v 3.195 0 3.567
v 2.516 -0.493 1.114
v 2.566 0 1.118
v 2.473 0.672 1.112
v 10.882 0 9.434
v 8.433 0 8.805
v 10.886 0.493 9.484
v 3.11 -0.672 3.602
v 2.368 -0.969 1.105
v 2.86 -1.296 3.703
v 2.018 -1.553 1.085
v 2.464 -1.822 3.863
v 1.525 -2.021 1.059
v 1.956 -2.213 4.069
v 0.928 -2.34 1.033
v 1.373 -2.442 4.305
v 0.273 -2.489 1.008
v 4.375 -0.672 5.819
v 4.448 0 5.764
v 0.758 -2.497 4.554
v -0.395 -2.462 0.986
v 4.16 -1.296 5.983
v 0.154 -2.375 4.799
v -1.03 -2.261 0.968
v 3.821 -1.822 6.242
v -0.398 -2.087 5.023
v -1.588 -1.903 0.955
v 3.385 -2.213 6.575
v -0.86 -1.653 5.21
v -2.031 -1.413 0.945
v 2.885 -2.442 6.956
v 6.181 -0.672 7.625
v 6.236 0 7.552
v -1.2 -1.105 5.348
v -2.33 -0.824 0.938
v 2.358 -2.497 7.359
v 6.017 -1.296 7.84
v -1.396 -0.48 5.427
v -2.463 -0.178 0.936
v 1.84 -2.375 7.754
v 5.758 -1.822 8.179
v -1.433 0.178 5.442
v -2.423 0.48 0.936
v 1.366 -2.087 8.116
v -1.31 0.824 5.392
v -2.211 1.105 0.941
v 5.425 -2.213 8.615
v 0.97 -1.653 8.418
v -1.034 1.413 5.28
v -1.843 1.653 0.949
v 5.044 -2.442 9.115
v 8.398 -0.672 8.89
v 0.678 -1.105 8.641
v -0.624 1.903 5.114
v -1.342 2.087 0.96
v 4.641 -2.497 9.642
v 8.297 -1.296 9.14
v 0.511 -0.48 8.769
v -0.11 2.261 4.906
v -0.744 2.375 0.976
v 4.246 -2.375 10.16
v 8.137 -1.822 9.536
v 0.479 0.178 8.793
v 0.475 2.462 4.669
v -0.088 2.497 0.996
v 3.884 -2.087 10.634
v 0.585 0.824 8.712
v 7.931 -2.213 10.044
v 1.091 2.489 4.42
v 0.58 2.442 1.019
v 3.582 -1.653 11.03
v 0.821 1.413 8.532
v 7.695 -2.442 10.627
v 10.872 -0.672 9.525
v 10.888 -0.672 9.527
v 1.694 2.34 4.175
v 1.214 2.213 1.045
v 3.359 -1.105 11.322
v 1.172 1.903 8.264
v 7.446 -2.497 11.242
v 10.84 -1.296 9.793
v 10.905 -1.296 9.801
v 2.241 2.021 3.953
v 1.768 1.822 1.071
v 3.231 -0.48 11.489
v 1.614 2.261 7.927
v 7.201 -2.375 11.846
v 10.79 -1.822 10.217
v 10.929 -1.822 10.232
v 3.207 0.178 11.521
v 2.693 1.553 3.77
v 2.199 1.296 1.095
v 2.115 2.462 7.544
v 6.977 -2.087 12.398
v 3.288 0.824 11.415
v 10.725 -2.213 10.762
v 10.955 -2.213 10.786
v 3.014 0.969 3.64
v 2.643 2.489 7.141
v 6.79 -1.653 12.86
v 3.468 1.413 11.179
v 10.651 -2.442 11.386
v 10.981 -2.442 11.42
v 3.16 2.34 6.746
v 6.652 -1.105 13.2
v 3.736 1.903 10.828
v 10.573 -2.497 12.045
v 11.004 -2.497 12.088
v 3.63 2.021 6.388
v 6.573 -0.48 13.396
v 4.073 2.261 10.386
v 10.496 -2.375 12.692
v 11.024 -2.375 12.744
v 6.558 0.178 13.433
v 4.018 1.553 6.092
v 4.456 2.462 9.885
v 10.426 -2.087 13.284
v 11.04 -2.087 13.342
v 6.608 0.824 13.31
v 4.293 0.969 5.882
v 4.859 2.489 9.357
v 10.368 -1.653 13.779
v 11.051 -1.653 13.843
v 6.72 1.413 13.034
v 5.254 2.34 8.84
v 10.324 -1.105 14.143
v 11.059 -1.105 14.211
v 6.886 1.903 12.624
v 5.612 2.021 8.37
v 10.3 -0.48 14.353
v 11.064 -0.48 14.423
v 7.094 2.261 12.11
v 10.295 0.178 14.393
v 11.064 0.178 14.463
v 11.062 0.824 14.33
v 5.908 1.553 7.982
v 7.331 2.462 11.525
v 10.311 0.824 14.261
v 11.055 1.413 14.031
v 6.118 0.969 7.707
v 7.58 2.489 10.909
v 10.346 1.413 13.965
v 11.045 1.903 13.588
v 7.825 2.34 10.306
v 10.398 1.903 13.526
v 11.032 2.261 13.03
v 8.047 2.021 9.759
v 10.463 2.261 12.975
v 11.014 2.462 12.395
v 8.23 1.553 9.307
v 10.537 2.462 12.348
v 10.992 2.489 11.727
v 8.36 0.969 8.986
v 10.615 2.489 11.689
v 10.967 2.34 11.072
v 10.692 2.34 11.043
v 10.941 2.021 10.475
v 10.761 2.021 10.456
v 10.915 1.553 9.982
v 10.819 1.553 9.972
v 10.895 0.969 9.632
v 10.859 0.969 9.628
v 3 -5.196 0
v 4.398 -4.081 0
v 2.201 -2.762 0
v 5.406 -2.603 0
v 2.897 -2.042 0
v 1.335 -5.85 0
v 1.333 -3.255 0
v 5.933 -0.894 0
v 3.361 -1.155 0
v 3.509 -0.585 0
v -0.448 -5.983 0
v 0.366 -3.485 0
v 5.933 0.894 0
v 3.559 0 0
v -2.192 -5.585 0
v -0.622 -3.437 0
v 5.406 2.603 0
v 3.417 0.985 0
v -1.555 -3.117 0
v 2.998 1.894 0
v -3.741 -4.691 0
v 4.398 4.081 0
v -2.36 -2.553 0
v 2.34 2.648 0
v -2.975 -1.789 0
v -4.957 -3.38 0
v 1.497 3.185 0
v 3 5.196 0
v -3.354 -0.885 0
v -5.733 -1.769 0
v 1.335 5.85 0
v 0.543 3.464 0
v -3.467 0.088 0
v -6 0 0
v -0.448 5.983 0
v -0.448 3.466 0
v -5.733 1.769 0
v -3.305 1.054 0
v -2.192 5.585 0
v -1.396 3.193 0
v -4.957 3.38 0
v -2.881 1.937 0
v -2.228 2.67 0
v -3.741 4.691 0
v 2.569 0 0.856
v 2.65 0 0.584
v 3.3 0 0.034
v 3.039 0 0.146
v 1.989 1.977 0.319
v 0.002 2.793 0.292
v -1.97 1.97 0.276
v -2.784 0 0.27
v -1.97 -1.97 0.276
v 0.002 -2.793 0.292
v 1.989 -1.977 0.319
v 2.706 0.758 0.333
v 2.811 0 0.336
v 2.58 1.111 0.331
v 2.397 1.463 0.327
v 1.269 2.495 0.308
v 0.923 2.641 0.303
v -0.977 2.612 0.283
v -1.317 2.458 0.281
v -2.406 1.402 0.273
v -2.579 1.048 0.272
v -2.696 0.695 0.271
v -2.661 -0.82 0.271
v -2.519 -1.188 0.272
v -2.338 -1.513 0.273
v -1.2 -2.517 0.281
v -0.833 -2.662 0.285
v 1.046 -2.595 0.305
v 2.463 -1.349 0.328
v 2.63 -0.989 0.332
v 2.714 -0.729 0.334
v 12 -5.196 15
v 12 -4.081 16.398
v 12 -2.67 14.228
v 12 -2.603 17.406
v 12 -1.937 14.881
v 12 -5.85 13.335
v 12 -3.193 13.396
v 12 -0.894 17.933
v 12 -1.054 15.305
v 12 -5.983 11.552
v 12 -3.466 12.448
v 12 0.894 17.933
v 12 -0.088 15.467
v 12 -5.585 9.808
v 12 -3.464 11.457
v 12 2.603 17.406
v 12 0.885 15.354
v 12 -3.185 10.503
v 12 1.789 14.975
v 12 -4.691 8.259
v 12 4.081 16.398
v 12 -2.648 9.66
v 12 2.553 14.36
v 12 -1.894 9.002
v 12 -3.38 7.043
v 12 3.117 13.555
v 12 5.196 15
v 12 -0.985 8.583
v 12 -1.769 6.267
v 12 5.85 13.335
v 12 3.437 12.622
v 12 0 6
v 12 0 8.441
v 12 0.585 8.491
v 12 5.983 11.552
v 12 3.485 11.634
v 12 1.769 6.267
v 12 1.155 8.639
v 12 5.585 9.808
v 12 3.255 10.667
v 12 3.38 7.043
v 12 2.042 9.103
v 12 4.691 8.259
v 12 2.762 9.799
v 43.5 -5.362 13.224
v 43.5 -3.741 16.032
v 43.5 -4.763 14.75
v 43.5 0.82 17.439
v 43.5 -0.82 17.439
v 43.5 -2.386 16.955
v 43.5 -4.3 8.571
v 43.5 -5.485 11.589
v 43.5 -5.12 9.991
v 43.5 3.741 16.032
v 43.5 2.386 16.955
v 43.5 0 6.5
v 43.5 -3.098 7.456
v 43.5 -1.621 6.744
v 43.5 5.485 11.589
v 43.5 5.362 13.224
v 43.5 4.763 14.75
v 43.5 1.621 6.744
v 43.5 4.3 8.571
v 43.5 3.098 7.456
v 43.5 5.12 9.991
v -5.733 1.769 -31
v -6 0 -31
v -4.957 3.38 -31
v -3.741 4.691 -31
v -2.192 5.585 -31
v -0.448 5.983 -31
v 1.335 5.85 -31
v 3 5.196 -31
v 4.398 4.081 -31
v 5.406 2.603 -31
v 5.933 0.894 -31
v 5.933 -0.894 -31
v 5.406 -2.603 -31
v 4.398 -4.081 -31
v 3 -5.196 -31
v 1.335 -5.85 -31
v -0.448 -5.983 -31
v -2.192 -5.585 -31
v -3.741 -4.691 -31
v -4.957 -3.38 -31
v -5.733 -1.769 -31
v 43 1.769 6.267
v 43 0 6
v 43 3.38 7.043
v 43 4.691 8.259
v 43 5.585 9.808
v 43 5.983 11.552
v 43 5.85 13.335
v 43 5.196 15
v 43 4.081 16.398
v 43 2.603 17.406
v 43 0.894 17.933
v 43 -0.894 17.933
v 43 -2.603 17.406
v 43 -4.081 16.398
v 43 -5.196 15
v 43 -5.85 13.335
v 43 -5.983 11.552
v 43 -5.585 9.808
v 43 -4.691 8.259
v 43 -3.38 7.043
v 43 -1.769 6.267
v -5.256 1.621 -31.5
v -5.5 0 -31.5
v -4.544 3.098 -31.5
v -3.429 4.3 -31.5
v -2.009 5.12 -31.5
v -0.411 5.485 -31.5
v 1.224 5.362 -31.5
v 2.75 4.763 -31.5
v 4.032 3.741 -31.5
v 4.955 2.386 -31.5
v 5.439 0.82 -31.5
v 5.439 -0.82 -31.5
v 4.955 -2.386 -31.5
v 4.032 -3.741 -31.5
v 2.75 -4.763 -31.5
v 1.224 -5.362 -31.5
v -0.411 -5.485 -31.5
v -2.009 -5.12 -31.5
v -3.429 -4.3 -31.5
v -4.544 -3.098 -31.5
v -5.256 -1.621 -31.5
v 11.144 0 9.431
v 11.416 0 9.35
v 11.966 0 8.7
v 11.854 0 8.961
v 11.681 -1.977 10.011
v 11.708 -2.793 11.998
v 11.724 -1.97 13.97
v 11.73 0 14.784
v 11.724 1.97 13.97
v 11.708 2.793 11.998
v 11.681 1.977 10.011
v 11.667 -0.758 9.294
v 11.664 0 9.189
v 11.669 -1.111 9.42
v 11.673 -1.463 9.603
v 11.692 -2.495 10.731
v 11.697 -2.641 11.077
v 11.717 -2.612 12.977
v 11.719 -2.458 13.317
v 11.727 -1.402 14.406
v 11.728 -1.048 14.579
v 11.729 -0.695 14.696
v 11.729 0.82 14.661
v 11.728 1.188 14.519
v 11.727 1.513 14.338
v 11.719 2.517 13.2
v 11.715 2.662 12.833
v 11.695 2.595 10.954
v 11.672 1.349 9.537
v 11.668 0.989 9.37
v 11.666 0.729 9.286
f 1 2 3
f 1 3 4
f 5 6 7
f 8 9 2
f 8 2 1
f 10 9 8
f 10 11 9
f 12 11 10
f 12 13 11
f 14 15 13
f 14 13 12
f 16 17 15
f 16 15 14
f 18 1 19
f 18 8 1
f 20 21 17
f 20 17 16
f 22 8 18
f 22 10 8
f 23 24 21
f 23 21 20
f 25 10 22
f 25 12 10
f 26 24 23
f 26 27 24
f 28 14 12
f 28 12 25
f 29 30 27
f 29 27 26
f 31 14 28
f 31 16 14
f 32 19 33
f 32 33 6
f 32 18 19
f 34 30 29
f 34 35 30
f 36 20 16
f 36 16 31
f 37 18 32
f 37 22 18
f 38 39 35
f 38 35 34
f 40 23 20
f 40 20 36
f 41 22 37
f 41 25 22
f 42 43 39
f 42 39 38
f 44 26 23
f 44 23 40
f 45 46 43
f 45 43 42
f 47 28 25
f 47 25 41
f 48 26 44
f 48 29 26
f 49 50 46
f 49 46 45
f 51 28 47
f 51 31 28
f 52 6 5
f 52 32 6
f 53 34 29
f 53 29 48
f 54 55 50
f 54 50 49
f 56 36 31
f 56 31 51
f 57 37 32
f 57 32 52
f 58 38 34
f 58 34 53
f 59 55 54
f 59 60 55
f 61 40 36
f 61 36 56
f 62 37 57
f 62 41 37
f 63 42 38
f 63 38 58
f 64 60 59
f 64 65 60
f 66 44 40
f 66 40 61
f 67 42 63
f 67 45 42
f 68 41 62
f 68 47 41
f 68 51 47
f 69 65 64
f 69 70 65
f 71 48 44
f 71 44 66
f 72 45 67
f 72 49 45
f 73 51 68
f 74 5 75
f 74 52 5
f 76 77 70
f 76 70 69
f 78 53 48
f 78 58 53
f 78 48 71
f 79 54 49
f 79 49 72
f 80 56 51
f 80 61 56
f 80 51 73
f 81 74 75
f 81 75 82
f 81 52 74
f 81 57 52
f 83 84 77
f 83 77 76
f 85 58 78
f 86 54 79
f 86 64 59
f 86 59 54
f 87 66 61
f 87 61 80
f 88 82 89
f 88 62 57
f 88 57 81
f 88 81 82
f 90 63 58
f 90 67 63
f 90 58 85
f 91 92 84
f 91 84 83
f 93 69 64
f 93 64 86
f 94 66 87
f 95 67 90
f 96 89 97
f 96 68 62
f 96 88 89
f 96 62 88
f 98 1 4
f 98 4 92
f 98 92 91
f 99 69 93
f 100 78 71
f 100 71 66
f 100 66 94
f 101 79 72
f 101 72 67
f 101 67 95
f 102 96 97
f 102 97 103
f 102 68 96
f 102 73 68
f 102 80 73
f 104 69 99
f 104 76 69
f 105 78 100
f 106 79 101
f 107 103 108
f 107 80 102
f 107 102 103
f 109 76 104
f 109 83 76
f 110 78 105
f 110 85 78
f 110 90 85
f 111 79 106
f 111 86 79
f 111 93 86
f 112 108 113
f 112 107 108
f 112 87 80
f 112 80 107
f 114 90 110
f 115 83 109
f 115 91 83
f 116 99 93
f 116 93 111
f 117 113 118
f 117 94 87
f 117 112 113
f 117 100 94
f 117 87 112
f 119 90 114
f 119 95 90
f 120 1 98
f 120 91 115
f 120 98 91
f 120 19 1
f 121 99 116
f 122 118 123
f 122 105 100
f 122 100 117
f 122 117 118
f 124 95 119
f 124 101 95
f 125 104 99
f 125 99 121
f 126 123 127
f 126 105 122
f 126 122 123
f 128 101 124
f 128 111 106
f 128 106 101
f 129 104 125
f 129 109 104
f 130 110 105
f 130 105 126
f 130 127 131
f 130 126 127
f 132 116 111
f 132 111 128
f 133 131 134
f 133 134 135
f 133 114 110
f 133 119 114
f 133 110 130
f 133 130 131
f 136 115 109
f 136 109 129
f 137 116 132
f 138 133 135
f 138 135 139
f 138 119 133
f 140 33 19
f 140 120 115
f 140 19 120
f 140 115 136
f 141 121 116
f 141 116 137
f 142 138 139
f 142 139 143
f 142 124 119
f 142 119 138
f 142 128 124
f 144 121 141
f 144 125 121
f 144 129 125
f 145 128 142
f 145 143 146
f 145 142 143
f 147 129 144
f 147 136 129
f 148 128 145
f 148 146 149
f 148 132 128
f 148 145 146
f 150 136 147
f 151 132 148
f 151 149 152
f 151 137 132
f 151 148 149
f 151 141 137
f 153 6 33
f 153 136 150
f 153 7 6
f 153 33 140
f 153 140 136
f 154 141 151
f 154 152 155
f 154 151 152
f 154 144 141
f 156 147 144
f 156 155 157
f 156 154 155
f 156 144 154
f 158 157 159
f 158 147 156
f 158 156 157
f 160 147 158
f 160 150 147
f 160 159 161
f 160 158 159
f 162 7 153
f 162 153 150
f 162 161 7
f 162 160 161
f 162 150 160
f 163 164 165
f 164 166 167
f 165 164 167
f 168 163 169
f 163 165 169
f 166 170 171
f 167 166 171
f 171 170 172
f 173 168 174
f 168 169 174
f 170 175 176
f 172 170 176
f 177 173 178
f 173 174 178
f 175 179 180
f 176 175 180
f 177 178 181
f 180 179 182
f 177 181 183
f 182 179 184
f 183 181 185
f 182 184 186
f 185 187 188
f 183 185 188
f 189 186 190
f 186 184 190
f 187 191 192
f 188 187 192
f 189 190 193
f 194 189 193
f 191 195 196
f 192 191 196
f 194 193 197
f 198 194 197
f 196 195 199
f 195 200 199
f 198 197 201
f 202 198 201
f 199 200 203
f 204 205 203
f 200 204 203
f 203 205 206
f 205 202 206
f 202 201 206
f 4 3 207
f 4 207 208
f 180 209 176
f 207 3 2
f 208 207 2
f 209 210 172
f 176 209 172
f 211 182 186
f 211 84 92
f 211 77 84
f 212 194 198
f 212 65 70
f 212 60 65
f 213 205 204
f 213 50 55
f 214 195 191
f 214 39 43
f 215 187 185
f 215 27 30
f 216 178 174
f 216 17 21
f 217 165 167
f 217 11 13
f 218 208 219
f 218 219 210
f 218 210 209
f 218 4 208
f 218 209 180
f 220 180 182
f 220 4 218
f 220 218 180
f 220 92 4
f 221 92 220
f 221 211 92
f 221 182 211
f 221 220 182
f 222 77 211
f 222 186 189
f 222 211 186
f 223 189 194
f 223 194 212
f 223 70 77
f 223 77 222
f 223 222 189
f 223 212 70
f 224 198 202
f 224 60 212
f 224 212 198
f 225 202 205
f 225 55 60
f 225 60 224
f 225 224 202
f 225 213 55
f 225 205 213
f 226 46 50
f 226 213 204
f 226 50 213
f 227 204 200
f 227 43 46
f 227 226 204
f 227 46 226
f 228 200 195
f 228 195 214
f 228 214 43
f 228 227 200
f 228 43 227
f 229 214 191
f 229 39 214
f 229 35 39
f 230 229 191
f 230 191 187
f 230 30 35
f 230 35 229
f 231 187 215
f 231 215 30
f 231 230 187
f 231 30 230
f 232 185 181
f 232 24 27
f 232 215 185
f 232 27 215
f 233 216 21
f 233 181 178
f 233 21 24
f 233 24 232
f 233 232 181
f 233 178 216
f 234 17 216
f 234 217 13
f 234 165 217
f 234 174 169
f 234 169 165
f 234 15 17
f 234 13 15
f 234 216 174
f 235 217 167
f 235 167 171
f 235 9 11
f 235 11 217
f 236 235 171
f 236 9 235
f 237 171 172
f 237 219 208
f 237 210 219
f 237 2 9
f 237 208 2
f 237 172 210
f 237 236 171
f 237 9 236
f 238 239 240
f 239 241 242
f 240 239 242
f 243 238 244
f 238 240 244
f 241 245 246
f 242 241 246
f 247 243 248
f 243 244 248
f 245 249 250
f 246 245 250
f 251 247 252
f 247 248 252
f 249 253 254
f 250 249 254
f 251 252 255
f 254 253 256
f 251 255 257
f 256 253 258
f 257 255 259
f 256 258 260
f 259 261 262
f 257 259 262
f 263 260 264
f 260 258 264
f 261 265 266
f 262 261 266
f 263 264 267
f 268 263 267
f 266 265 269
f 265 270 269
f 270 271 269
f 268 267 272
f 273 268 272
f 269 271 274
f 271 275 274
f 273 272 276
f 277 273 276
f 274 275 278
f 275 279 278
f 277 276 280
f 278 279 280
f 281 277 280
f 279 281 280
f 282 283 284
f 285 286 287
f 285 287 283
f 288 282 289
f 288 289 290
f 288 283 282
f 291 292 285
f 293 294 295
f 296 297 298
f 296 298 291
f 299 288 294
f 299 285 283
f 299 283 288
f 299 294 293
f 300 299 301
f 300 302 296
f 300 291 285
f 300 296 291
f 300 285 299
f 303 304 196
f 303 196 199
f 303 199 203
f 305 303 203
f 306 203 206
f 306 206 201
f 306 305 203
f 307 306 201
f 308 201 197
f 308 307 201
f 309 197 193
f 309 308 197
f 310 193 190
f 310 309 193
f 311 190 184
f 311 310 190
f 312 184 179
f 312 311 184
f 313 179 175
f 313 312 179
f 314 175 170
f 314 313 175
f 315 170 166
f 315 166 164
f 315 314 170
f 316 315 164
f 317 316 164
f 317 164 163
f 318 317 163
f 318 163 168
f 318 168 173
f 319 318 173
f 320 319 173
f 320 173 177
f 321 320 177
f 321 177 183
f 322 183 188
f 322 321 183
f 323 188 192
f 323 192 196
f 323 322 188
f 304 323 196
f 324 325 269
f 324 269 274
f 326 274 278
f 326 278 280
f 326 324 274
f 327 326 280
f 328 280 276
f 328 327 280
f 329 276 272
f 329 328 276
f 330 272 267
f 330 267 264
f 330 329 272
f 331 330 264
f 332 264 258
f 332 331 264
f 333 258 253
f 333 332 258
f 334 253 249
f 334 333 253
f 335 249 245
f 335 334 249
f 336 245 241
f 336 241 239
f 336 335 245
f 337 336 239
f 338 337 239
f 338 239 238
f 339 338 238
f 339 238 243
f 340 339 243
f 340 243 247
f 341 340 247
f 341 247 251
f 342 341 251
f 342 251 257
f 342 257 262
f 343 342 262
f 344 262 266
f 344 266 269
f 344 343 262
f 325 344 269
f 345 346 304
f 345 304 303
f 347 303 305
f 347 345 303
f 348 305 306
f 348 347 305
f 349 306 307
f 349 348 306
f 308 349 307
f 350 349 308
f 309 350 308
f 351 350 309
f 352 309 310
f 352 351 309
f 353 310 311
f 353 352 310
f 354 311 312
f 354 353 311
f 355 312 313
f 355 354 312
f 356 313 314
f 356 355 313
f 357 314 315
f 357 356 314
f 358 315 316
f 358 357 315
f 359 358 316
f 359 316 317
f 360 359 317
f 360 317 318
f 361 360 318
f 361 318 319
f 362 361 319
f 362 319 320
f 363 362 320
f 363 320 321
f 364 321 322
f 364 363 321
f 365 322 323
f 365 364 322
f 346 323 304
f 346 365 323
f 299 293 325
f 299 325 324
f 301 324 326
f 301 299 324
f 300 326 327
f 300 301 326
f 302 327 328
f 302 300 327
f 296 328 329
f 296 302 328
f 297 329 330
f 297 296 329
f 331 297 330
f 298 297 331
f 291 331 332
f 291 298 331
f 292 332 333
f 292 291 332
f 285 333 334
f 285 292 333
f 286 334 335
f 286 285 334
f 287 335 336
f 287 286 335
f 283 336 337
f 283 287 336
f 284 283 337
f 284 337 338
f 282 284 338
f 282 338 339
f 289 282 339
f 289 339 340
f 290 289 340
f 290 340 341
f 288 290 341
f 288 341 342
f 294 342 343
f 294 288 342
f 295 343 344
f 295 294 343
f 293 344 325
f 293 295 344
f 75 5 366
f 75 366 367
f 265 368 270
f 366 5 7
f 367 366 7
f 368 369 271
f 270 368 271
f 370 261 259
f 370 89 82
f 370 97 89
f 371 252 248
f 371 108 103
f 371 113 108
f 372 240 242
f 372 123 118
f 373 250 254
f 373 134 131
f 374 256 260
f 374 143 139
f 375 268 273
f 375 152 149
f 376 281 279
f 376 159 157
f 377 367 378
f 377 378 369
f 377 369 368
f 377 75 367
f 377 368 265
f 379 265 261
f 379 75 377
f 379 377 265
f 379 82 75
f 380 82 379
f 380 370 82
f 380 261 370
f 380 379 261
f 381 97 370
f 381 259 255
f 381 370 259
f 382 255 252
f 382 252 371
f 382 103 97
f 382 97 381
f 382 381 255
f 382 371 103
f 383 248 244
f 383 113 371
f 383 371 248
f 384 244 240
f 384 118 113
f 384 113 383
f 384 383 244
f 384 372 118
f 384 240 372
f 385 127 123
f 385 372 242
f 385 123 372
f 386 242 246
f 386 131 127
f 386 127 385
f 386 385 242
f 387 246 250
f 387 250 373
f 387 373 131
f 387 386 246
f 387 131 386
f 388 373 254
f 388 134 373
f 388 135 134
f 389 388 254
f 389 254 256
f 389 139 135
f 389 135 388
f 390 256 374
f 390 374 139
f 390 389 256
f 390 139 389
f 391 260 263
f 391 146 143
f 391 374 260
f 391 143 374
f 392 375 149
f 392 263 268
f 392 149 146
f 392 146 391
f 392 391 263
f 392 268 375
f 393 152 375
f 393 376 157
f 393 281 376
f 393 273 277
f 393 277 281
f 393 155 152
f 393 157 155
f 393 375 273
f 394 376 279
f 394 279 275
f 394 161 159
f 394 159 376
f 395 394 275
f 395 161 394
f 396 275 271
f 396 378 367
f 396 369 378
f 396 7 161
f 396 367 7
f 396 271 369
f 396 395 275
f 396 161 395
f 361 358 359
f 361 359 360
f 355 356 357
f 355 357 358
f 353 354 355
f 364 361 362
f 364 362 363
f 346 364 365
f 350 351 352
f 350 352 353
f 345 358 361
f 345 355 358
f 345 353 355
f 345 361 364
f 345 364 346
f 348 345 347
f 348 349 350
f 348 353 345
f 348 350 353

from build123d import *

# Parameters (mm, degrees)
SWEEP2_PROFILE_R     = 2.5
SKETCH49_R           = 6
BOSS_EXTRUDE9_DEPTH  = 31.5
SKETCH54_R           = 6
BOSS_EXTRUDE10_DEPTH = 31.5
FILLET32_R           = 1
FILLET33_R           = 1
CHAMFER1_SIZE        = 0.5
CHAMFER2_SIZE        = 0.5


with BuildPart() as part:
    # Sweep2: sweep along a path in Sketch1
    with BuildLine(Plane(origin=(0, 0, 0), x_dir=(1, 0, 0), z_dir=(0, 1, 0))) as sweep2_path:
        Line((0, 31.5), (0, 0))
        ThreePointArc((0, 0), (3.514718626, -8.485281374), (12, -12))
        Line((12, -12), (43.5, -12))
    # Sweep2 profile (on start of the path) → Sweep2 (sweep)
    with BuildSketch(Plane.XY.offset(-31.5)):
        Circle(SWEEP2_PROFILE_R)
    sweep(path=sweep2_path.line)

    # Sketch49 → Boss-Extrude9 (add)
    with BuildSketch(Plane(origin=(43.5, 0, 0), x_dir=(0, 0, -1), z_dir=(1, 0, 0))):
        with Locations((-12, 0)):
            Circle(SKETCH49_R)
    extrude(amount=-BOSS_EXTRUDE9_DEPTH)

    # Sketch54 → Boss-Extrude10 (add)
    with BuildSketch(Plane(origin=(0, 0, -31.5), x_dir=(-1, 0, 0), z_dir=(0, 0, -1))):
        Circle(SKETCH54_R)
    extrude(amount=-BOSS_EXTRUDE10_DEPTH)

    # Fillet32
    fillet32_edges = [part.edges().sort_by_distance(p)[0] for p in [
        (12, 0, 14.5),
    ]]
    fillet(fillet32_edges, radius=FILLET32_R)

    # Fillet33
    fillet33_edges = [part.edges().sort_by_distance(p)[0] for p in [
        (-2.5, 0, 0),
    ]]
    fillet(fillet33_edges, radius=FILLET33_R)

    # Chamfer1
    chamfer1_edges = [part.edges().sort_by_distance(p)[0] for p in [
        (43.5, 0, 18),
    ]]
    chamfer(chamfer1_edges, length=CHAMFER1_SIZE)

    # Chamfer2
    chamfer2_edges = [part.edges().sort_by_distance(p)[0] for p in [
        (6, 0, -31.5),
    ]]
    chamfer(chamfer2_edges, length=CHAMFER2_SIZE)


solid = part.part
